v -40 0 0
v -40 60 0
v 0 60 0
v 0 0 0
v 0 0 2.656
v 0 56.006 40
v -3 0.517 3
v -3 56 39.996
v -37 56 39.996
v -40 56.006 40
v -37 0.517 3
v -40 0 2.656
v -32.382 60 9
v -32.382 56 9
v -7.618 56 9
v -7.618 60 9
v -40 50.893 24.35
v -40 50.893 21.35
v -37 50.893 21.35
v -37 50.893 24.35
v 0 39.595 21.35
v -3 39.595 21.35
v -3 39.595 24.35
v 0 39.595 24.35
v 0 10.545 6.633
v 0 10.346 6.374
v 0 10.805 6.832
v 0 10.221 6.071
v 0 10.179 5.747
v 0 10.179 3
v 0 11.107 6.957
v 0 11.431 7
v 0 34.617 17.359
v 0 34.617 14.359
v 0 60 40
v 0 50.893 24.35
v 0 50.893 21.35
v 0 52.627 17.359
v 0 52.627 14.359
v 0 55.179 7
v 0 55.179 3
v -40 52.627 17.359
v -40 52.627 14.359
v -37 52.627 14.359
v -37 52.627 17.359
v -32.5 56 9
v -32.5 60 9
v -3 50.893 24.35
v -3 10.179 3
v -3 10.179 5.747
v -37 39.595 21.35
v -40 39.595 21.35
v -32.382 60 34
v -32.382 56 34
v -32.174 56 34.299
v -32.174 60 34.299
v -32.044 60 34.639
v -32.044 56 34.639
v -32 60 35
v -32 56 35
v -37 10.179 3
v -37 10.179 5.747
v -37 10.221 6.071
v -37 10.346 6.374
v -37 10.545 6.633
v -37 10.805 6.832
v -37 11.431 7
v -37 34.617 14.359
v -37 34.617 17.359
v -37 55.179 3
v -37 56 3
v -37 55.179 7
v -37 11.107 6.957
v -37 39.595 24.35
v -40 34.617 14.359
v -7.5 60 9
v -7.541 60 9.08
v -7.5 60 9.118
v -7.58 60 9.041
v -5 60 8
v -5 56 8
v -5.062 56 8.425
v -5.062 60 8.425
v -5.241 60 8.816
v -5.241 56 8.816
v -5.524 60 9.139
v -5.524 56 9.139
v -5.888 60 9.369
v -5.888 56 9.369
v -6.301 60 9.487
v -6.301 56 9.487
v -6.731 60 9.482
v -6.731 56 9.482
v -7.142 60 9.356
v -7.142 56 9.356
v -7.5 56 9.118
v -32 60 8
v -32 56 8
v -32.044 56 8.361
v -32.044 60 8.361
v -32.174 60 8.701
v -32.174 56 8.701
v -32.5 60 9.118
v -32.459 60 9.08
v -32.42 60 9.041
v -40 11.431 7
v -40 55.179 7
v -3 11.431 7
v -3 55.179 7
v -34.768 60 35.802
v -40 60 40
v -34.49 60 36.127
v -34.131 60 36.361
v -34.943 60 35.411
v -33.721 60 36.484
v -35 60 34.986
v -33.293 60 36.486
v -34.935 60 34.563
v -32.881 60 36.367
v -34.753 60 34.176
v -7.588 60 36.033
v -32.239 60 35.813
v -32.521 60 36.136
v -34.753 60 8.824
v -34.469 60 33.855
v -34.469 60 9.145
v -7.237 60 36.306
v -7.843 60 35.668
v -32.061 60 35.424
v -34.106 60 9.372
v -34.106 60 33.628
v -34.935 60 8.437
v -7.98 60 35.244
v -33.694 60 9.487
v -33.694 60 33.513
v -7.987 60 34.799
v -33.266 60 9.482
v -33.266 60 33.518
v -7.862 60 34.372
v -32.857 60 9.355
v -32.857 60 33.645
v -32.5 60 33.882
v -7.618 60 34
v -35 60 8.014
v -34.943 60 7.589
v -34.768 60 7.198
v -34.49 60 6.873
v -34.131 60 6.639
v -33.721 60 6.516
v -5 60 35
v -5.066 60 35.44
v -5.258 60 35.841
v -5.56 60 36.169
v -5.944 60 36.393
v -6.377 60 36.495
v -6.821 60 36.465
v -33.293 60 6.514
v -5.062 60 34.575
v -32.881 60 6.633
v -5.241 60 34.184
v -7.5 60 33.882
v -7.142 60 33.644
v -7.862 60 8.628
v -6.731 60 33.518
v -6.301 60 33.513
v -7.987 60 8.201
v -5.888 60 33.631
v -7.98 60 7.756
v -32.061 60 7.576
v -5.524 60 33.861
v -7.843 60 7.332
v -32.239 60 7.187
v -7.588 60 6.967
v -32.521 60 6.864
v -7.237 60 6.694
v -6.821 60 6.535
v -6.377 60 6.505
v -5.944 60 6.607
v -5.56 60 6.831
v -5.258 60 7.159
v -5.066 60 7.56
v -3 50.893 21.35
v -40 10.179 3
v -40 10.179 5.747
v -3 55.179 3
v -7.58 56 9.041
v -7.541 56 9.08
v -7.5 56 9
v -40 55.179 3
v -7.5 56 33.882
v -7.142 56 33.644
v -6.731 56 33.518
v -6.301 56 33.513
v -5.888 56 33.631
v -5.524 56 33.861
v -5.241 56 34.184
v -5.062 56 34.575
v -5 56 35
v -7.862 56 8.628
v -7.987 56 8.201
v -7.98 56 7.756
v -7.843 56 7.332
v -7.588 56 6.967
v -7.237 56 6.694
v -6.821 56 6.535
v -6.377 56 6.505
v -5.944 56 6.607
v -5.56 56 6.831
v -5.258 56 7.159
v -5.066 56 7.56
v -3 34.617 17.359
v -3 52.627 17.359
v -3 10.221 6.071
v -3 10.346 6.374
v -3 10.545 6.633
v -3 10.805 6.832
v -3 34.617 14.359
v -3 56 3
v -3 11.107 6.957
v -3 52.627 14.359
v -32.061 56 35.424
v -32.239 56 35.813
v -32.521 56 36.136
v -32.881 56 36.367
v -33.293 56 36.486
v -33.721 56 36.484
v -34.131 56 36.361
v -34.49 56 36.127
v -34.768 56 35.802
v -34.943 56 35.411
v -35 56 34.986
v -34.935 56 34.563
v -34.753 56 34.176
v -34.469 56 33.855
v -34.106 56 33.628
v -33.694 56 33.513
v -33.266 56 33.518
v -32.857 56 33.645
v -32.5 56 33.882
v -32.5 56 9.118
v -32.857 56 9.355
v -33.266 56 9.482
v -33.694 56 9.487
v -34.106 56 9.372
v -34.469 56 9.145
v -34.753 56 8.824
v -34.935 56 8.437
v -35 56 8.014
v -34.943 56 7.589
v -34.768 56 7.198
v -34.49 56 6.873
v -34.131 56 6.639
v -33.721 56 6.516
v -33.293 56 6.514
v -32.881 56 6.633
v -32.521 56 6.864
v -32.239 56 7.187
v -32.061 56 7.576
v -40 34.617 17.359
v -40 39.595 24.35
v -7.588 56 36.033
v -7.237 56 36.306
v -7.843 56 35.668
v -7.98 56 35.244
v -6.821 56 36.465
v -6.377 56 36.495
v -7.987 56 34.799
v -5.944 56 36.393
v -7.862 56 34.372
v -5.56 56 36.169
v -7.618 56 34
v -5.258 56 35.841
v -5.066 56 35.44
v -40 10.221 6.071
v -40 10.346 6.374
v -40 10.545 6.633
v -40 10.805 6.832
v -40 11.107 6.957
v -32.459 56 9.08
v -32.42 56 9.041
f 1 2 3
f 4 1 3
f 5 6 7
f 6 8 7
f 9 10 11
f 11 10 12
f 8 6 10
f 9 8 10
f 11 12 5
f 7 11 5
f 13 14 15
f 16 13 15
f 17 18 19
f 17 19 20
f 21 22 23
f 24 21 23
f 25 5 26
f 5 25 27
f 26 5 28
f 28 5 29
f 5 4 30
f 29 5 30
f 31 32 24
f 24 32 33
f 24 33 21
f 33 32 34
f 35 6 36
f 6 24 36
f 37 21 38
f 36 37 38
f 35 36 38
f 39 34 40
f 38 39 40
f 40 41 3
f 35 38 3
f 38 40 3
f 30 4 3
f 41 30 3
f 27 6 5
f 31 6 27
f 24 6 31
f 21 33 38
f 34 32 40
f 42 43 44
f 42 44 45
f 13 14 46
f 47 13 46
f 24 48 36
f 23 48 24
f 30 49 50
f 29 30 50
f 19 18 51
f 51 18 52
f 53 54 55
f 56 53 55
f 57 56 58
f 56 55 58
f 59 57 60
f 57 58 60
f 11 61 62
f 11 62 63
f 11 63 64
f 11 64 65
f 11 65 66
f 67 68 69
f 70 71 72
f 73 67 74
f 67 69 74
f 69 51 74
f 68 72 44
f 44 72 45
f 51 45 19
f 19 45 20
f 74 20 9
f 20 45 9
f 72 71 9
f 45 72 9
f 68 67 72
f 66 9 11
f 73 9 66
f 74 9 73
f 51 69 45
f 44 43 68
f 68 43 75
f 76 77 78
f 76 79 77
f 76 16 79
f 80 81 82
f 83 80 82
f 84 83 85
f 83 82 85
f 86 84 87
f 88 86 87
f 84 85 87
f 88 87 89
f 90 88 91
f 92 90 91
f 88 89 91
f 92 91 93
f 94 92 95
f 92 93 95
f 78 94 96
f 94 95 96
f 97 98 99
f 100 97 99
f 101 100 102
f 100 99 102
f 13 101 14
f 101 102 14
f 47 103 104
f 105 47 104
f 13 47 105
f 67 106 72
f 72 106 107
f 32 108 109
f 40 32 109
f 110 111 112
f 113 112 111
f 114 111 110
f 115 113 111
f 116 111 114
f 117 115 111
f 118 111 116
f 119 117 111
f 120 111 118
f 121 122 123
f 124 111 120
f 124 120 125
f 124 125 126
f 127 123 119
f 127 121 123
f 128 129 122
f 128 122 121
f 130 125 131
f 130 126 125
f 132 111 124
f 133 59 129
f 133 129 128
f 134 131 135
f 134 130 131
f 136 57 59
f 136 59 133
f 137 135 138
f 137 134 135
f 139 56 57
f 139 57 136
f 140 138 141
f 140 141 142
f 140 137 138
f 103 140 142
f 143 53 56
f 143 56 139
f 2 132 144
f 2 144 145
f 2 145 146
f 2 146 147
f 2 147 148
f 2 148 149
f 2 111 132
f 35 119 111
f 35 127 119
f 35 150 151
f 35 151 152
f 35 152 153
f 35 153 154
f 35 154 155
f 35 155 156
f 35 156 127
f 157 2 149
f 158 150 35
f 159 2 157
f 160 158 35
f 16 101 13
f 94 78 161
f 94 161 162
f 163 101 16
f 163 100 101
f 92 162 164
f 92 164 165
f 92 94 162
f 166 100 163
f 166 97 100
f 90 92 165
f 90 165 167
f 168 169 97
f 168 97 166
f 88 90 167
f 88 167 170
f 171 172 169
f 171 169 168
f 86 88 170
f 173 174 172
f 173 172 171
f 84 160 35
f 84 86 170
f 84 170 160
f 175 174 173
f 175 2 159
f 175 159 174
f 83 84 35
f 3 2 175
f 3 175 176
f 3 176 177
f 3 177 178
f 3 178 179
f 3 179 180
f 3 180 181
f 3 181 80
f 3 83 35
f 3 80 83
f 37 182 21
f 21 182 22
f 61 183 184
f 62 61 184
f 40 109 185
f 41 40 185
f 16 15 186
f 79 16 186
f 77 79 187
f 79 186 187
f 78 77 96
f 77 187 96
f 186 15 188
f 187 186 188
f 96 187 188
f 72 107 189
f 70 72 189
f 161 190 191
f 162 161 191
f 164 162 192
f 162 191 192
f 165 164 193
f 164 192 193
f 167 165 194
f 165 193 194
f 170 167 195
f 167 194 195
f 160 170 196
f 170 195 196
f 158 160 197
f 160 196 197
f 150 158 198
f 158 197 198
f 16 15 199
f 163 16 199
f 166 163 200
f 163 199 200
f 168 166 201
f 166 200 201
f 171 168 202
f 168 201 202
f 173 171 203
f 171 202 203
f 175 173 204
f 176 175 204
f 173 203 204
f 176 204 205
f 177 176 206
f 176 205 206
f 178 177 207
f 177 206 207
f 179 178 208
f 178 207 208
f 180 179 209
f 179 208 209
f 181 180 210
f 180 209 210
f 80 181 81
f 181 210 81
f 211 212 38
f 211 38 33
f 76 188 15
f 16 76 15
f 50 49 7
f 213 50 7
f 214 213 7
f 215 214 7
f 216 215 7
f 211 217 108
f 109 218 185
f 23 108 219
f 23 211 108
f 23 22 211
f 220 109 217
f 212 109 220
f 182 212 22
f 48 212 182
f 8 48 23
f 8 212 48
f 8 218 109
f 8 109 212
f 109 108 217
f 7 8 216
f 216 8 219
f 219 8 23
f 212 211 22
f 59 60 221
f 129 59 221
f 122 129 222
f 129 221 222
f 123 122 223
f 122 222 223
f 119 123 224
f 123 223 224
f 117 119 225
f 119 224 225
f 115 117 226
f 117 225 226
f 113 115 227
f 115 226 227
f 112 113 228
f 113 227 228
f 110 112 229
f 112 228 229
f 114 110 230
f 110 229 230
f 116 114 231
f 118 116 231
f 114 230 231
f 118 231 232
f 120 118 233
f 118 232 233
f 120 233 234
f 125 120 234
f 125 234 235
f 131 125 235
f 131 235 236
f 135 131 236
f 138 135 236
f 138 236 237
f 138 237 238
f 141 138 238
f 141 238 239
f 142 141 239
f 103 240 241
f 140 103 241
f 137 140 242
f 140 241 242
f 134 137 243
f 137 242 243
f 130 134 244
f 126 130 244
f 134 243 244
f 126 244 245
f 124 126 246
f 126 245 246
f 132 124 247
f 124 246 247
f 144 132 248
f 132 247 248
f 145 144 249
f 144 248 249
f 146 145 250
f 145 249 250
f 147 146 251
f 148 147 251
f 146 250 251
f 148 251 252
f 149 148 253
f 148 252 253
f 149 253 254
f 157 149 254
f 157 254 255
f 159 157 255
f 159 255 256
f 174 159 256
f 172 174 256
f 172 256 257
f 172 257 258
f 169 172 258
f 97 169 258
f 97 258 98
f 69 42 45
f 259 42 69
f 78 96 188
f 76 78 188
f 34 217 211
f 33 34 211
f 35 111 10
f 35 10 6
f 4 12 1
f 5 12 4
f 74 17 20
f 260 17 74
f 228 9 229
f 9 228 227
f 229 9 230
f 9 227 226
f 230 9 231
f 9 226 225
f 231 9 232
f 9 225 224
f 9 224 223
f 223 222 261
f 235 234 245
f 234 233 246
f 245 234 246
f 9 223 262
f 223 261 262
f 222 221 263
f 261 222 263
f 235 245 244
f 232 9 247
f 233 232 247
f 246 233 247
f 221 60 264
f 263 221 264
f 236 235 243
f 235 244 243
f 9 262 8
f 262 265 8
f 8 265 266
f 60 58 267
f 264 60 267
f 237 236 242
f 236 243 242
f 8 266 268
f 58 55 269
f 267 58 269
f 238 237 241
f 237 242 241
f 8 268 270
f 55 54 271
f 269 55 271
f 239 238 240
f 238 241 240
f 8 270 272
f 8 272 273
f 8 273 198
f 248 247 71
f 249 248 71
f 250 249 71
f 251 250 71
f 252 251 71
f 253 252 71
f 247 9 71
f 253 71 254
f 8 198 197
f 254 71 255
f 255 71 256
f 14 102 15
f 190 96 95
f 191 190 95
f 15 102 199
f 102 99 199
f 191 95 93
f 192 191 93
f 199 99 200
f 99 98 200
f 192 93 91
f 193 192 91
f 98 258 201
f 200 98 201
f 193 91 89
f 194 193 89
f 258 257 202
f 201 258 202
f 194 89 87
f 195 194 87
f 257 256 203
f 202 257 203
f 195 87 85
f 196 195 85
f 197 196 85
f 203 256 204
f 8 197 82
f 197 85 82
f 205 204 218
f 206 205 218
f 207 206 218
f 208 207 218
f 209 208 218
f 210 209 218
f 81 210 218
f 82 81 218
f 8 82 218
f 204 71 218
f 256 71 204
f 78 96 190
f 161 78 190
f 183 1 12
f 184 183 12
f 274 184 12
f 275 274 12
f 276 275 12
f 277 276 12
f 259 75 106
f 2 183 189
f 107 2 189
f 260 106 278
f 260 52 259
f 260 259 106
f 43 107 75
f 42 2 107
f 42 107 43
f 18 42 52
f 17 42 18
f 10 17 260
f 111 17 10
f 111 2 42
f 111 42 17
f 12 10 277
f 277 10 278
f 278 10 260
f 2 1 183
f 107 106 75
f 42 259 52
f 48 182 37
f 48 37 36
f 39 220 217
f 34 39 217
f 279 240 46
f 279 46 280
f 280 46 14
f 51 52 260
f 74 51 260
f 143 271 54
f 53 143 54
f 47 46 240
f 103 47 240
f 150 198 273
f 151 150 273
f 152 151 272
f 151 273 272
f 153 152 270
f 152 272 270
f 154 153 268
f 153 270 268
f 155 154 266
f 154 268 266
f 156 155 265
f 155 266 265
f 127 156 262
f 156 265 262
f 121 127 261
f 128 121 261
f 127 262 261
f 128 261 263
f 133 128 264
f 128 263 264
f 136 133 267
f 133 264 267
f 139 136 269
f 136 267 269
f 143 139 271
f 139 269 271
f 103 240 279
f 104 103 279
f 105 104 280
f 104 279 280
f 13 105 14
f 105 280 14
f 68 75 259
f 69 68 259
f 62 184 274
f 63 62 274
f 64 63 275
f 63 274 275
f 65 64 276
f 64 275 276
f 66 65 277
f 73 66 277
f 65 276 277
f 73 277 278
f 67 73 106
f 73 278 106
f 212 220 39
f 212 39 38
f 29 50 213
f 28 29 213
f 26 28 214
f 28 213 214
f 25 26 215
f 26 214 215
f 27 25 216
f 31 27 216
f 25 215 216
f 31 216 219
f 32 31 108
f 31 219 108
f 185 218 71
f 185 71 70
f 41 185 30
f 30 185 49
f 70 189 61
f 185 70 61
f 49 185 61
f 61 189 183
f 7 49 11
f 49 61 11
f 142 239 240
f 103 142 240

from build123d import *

# Parameters (mm, degrees)
F0_W      = 40
F0_H      = 56
F1_DEPTH  = 3
F0_H_2    = 4
F2_DEPTH  = 40
F3_W      = 3
F3_H      = 37
F4_DEPTH  = 56
F6_DEPTH  = 40.001
F8_DEPTH  = 4.001
F9_W      = 11.2977698445
F9_H      = 3
F9_W_2    = 18.0093161762
F10_DEPTH = 40.001


with BuildPart() as f1:
    # F0 (on Top) → F1 (new body)
    with BuildSketch(Plane.XY):
        with Locations((-20, 28)):
            Rectangle(F0_W, F0_H)
    extrude(amount=F1_DEPTH)

    # F0 (on Top) → F2 (join)
    with BuildSketch(Plane.XY):
        with Locations((-20, 58)):
            Rectangle(F0_W, F0_H_2)
    extrude(amount=F2_DEPTH)

    # F3 (on face) → F4 (join)
    with BuildSketch(Plane.XZ.offset(-56)):
        with Locations((-38.5, 21.5)):
            Rectangle(F3_W, F3_H)
        with Locations((-1.5, 21.5)):
            Rectangle(F3_W, F3_H)
    extrude(amount=F4_DEPTH)

    # F5 (on face) → F6 (cut, through all)
    with BuildSketch(Plane(origin=(-40, 0, 0), x_dir=(0, -1, 0), z_dir=(-1, 0, 0))):
        Polygon((0, 40), (-56.0063011944, 40), (0, 2.6555121876), align=None)
    extrude(amount=-F6_DEPTH, mode=Mode.SUBTRACT)

    # F7 (on face) → F8 (cut, through all)
    with BuildSketch(Plane.XZ.offset(-56)):
        with BuildLine():
            Line((-32.3819660113, 34), (-32.5, 34))
            Line((-32.5, 34), (-32.5, 33.8819660113))
            ThreePointArc((-32.5, 33.8819660113), (-32.4393398282, 33.9393398282), (-32.3819660113, 34))
        make_face()
        with BuildLine():
            Line((-7.6180339887, 34), (-32.3819660113, 34))
            ThreePointArc((-32.3819660113, 34), (-32.4393398282, 33.9393398282), (-32.5, 33.8819660113))
            Line((-32.5, 33.8819660113), (-32.5, 9.1180339887))
            ThreePointArc((-32.5, 9.1180339887), (-32.4393398282, 9.0606601718), (-32.3819660113, 9))
            Line((-32.3819660113, 9), (-7.6180339887, 9))
            ThreePointArc((-7.6180339887, 9), (-7.5606601718, 9.0606601718), (-7.5, 9.1180339887))
            Line((-7.5, 9.1180339887), (-7.5, 33.8819660113))
            ThreePointArc((-7.5, 33.8819660113), (-7.5606601718, 33.9393398282), (-7.6180339887, 34))
        make_face()
        with BuildLine():
            Line((-7.5, 34), (-7.6180339887, 34))
            ThreePointArc((-7.6180339887, 34), (-7.5606601718, 33.9393398282), (-7.5, 33.8819660113))
            Line((-7.5, 33.8819660113), (-7.5, 34))
        make_face()
        with BuildLine():
            Line((-32.5, 33.8819660113), (-32.5, 34))
            Line((-32.5, 34), (-32.3819660113, 34))
            ThreePointArc((-32.3819660113, 34), (-32.0987414616, 34.4647668653), (-32, 35))
            ThreePointArc((-32, 35), (-34.8693063938, 35.6123724357), (-32.5, 33.8819660113))
        make_face()
        with BuildLine():
            Line((-32.5, 9), (-32.5, 9.1180339887))
            ThreePointArc((-32.5, 9.1180339887), (-34.8693063938, 7.3876275643), (-32, 8))
            ThreePointArc((-32, 8), (-32.0987414616, 8.5352331347), (-32.3819660113, 9))
            Line((-32.3819660113, 9), (-32.5, 9))
        make_face()
        with BuildLine():
            ThreePointArc((-5, 35), (-7.0352331347, 36.4012585384), (-7.6180339887, 34))
            Line((-7.6180339887, 34), (-7.5, 34))
            Line((-7.5, 34), (-7.5, 33.8819660113))
            ThreePointArc((-7.5, 33.8819660113), (-5.8876275643, 33.6306936062), (-5, 35))
        make_face()
        with BuildLine():
            ThreePointArc((-5, 8), (-5.8876275643, 9.3693063938), (-7.5, 9.1180339887))
            Line((-7.5, 9.1180339887), (-7.5, 9))
            Line((-7.5, 9), (-7.6180339887, 9))
            ThreePointArc((-7.6180339887, 9), (-7.0352331347, 6.5987414616), (-5, 8))
        make_face()
    extrude(amount=-F8_DEPTH, mode=Mode.SUBTRACT)

    # F9 (on face) → F10 (cut, through all)
    with BuildSketch(Plane(origin=(-40, 0, 0), x_dir=(0, -1, 0), z_dir=(-1, 0, 0))):
        with BuildLine():
            Line((-55.1785277575, 7), (-55.1785277575, 3))
            Line((-55.1785277575, 3), (-10.1785277575, 3))
            Line((-10.1785277575, 3), (-10.1785277575, 5.7471251963))
            ThreePointArc((-10.1785277575, 5.7471251963), (-10.5454862916, 6.633041466), (-11.4314025613, 7))
            Line((-11.4314025613, 7), (-55.1785277575, 7))
        make_face()
        with Locations((-45.2438443899, 22.8499646634)):
            Rectangle(F9_W, F9_H)
        with Locations((-43.6218883842, 15.8587701023)):
            Rectangle(F9_W_2, F9_H)
    extrude(amount=-F10_DEPTH, mode=Mode.SUBTRACT)


solid = f1.part
